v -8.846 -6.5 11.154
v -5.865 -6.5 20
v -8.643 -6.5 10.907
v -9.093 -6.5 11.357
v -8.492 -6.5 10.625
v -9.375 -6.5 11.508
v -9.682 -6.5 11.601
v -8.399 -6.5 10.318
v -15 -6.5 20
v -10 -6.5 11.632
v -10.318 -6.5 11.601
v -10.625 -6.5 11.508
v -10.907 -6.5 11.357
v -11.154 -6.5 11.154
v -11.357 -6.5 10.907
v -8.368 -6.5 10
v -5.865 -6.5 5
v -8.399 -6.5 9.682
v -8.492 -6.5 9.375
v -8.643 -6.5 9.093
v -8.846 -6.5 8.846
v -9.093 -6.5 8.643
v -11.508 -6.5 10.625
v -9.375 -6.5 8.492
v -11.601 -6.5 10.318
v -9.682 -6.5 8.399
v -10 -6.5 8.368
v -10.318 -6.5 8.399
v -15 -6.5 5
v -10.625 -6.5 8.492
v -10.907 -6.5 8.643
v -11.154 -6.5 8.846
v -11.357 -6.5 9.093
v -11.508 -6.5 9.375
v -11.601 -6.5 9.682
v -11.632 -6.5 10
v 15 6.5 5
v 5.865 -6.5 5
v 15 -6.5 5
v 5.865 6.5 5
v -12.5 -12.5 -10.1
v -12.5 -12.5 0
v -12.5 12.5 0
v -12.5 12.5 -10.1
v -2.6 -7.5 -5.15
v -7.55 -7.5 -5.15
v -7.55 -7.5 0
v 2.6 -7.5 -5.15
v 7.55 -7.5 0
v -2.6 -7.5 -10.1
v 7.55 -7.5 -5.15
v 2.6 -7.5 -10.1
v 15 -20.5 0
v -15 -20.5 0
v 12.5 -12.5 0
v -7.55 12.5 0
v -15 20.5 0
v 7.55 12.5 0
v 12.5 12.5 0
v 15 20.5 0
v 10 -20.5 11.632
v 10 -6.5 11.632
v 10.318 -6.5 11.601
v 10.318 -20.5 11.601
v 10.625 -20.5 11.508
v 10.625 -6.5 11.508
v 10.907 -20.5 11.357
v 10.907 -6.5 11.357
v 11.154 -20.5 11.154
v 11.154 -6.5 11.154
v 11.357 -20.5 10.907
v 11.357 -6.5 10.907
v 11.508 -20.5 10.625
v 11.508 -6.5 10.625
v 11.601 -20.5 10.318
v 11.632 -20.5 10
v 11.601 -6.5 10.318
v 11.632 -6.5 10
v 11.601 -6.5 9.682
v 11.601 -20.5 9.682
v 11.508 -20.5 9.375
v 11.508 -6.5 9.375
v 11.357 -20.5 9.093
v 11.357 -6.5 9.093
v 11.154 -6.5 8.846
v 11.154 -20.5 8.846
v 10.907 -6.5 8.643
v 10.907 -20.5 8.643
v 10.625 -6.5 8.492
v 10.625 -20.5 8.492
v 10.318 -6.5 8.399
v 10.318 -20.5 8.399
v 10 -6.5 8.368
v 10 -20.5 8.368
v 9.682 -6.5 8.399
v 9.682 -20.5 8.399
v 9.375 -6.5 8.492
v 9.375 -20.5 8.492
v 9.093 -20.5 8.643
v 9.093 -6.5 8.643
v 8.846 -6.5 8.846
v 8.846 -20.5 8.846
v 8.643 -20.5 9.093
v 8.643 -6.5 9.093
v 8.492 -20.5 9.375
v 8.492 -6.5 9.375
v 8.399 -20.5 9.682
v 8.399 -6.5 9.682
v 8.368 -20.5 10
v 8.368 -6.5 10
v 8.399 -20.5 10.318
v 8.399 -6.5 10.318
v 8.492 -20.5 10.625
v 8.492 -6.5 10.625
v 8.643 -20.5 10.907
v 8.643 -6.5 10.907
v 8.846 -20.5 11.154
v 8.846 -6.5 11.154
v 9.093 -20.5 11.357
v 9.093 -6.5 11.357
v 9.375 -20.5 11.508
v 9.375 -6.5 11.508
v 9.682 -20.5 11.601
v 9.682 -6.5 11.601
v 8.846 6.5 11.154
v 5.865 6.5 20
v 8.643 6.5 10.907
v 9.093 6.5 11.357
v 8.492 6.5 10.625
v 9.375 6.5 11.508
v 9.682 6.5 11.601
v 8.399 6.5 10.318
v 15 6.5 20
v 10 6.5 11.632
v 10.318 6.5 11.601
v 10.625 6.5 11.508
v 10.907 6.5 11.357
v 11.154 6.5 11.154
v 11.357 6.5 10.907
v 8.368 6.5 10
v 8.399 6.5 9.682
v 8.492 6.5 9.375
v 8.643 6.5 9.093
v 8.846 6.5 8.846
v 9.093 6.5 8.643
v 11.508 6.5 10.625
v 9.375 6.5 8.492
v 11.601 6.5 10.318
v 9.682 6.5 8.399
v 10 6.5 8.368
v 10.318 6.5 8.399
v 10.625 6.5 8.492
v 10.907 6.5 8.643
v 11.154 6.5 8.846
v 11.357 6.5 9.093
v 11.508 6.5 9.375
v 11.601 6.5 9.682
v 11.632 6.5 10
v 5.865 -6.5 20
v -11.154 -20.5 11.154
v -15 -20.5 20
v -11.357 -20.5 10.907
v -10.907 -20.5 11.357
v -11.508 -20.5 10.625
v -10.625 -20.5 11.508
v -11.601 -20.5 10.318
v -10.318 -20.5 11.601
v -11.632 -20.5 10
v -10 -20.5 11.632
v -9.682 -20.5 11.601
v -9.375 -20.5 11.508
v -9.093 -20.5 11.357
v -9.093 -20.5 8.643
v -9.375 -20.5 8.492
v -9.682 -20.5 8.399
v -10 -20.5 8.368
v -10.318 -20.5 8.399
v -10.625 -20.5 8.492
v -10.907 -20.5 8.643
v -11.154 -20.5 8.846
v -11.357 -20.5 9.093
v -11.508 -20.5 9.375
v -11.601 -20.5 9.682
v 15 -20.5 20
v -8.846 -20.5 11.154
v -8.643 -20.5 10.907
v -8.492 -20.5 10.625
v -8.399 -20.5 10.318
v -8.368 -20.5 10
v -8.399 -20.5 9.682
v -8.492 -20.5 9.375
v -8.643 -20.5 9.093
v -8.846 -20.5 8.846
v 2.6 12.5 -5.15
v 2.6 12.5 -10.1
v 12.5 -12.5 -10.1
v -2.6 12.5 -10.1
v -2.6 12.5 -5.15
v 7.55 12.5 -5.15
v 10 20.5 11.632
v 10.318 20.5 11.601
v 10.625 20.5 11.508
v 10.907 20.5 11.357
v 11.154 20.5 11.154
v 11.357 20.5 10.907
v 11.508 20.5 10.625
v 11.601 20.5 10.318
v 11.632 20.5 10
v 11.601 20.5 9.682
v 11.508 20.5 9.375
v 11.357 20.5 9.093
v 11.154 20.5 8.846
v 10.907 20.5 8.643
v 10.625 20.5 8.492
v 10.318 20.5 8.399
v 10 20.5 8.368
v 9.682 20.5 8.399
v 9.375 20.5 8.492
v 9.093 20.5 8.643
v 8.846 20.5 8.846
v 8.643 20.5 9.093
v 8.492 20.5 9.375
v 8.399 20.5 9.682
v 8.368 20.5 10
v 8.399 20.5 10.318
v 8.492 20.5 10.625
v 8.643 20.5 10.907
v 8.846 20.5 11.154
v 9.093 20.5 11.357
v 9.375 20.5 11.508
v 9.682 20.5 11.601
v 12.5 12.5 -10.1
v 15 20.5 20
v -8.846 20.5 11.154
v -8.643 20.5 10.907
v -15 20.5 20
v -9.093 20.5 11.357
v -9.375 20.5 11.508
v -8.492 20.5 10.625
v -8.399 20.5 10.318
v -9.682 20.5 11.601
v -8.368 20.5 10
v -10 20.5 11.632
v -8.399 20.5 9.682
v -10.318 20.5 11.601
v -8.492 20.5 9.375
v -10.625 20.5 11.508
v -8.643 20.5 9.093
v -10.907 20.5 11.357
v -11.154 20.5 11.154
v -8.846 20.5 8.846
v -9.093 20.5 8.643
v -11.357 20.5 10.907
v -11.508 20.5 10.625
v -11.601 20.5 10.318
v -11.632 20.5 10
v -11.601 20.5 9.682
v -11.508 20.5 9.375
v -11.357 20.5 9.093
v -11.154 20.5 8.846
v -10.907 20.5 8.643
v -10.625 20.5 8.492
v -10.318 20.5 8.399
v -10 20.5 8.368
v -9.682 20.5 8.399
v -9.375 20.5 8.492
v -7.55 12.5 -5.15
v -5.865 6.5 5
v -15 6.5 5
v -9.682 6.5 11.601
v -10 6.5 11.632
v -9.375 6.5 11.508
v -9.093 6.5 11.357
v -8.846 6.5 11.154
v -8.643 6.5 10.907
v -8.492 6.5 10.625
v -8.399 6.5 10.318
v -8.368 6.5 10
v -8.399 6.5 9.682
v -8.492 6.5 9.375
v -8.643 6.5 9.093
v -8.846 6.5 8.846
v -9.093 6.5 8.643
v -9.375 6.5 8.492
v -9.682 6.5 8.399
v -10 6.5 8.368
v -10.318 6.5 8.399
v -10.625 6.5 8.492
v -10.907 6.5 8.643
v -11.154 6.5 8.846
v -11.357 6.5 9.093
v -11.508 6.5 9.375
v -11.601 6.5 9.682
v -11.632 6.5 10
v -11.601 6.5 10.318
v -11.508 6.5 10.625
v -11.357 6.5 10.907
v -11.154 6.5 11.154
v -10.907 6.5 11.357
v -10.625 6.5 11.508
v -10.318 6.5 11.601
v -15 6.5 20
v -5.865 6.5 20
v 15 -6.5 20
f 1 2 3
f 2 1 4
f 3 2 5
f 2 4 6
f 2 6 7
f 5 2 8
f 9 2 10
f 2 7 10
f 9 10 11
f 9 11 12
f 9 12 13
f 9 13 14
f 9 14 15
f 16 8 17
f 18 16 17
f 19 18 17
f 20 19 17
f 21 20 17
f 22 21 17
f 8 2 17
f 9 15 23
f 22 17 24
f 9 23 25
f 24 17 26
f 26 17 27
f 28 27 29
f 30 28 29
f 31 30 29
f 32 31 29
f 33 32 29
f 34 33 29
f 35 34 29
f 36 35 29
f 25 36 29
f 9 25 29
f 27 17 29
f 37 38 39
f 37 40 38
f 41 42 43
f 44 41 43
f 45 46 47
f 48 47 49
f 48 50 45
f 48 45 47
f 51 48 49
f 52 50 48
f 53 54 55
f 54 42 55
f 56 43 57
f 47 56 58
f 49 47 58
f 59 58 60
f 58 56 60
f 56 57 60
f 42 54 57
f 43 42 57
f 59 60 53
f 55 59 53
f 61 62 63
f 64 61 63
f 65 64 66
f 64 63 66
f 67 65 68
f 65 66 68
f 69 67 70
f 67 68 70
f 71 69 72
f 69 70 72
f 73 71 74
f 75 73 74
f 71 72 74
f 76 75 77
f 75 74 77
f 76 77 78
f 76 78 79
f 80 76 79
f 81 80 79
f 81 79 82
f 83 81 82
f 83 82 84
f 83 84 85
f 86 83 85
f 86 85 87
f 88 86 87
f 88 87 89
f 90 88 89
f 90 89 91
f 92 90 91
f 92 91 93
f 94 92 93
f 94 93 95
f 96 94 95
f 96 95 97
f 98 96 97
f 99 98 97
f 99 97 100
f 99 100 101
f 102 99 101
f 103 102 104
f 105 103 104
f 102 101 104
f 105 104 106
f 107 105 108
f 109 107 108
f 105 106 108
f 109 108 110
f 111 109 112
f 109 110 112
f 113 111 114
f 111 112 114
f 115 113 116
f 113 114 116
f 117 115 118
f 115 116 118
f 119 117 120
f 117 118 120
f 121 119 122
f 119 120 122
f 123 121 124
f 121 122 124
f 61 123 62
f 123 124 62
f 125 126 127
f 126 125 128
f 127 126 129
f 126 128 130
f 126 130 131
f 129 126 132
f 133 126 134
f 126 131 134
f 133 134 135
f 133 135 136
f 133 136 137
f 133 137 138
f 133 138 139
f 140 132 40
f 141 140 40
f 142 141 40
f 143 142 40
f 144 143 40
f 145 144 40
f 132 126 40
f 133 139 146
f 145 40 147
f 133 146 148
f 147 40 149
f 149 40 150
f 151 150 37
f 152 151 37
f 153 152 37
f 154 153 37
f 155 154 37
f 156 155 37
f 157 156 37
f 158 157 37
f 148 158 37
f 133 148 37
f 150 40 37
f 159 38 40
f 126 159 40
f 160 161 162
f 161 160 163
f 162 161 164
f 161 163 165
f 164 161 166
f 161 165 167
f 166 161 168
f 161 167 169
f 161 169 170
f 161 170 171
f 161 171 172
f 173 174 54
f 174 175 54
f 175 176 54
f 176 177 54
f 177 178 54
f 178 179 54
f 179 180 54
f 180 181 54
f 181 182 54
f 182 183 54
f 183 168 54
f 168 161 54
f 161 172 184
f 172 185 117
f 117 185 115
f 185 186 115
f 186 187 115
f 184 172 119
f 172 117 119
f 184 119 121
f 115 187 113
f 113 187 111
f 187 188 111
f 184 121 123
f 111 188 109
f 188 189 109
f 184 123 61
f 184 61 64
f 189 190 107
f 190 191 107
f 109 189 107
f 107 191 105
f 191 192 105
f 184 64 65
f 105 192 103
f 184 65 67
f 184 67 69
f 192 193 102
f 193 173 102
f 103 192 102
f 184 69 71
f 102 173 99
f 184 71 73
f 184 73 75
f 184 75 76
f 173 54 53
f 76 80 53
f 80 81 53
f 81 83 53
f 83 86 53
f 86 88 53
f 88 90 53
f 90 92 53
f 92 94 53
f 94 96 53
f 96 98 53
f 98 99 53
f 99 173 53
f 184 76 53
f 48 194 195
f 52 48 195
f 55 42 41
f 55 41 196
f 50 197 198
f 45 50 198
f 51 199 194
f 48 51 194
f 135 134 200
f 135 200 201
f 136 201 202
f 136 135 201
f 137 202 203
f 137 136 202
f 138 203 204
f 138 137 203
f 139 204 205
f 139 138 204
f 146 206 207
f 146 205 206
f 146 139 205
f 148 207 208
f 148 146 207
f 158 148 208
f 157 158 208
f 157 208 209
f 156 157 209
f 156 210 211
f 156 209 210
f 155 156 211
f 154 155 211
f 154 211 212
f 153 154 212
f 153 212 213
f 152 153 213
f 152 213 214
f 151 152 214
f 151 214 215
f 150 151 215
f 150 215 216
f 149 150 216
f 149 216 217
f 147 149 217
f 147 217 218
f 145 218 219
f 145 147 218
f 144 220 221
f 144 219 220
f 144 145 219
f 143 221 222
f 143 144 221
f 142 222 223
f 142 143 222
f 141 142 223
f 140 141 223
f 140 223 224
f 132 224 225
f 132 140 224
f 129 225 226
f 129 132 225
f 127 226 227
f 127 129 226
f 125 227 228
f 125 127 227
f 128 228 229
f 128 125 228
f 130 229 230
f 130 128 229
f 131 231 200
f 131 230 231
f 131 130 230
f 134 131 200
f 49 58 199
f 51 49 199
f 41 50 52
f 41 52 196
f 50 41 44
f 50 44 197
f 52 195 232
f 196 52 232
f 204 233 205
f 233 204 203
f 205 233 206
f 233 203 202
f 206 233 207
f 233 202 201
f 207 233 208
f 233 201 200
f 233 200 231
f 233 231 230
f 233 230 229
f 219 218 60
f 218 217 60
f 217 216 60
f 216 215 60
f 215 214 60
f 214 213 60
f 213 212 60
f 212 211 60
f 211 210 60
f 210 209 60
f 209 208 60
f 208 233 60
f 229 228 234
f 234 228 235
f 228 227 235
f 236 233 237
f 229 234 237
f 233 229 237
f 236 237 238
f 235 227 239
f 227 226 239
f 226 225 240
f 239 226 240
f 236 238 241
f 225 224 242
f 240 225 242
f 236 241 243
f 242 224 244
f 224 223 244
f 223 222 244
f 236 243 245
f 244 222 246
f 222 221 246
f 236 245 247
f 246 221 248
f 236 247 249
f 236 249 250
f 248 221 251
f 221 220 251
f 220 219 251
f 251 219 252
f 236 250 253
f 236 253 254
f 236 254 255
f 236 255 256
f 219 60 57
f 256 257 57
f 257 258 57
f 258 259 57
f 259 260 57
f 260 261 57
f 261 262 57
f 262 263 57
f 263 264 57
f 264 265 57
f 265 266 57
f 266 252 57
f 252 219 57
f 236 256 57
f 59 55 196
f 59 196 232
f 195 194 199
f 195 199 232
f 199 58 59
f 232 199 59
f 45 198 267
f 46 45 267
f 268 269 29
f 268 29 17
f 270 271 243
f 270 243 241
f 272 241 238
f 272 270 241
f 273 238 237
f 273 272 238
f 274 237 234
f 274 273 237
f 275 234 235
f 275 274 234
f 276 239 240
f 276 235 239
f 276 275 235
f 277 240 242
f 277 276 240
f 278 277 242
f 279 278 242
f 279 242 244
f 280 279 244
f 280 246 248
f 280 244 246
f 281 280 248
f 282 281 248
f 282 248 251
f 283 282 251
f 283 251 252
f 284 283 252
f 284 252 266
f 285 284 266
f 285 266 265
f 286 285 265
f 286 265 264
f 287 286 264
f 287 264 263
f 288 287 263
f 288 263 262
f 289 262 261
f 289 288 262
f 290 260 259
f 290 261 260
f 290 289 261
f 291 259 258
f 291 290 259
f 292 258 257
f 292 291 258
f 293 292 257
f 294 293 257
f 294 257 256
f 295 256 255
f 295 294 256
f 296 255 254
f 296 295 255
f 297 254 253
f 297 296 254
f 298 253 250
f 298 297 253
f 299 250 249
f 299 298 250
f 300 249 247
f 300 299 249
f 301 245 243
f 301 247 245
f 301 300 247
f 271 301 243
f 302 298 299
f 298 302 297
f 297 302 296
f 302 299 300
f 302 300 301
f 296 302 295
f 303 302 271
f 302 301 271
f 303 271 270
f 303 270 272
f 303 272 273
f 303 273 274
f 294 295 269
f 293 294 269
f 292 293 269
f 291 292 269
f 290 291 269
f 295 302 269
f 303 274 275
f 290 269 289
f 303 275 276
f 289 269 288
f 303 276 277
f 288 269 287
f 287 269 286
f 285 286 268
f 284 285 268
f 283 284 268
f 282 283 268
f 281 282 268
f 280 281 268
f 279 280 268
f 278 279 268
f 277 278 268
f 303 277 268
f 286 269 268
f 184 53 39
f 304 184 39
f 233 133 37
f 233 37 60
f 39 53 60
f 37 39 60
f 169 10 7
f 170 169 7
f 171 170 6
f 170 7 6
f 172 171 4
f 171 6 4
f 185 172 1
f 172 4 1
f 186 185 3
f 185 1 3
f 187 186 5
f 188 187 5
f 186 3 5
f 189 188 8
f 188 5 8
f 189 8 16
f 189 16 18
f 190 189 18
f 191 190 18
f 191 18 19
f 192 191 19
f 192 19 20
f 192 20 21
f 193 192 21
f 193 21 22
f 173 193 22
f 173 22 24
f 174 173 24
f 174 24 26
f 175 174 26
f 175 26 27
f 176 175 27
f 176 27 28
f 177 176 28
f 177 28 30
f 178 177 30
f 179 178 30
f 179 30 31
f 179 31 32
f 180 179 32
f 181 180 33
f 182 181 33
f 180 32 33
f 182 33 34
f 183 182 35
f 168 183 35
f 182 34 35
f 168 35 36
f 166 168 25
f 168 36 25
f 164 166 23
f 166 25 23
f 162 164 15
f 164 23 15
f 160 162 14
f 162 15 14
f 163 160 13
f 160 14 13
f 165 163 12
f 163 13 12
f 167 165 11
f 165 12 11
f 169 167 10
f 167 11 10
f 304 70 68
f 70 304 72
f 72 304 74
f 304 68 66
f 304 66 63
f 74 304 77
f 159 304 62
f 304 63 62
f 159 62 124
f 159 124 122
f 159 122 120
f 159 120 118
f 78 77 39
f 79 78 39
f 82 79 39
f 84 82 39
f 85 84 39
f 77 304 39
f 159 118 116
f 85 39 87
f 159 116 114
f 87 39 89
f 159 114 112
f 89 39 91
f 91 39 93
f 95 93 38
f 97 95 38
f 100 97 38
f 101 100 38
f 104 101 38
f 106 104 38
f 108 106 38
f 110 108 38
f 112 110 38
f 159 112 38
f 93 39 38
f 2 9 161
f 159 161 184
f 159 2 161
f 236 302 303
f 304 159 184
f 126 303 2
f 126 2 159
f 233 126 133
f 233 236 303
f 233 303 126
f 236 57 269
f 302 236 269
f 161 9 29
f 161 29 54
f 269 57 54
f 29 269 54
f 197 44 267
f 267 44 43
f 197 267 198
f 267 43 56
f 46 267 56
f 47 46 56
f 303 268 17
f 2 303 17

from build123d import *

# Parameters (mm, degrees)
BOSS_EXTRUDE1_DEPTH     = 20
SKETCH3_R               = 1.632108338
CUT_EXTRUDE1_DEPTH      = 33.330326321
CUT_EXTRUDE1_DEPTH_BACK = 33.330326321
SKETCH4_W               = 30
SKETCH4_H               = 41
BOSS_EXTRUDE2_DEPTH     = 5
SKETCH6_W               = 25
SKETCH6_H               = 25
BOSS_EXTRUDE3_DEPTH     = 20
CUT_EXTRUDE4_START      = 12.5
CUT_EXTRUDE4_DEPTH      = 20
SKETCH8_W               = 9.9
SKETCH8_H               = 9.9
SKETCH8_W_2             = 15.1
CUT_EXTRUDE5_DEPTH      = 33.330326321
CUT_EXTRUDE5_DEPTH_BACK = 33.330326321


with BuildPart() as part:
    # Sketch2 → Boss-Extrude1 (new body)
    with BuildSketch(Plane.XY):
        Polygon((0, 20.5), (-15, 20.5), (-15, 6.5), (-5.864885696, 6.5), (-5.864885696, -6.5), (-15, -6.5), (-15, -20.5), (0, -20.5), (15, -20.5), (15, -6.5), (5.864885696, -6.5), (5.864885696, 6.5), (15, 6.5), (15, 20.5), align=None)
    extrude(amount=BOSS_EXTRUDE1_DEPTH)

    # Sketch3 → Cut-Extrude1 (cut, two sides)
    with BuildSketch(Plane(origin=(0, 0, 0), x_dir=(1, 0, 0), z_dir=(0, 1, 0))) as cut_extrude1_sk:
        with Locations(Location((-10, -10, 0), (0, 0, 270))):
            Circle(SKETCH3_R)
        with Locations(Location((10, -10, 0), (0, 0, 270))):
            Circle(SKETCH3_R)
    extrude(amount=CUT_EXTRUDE1_DEPTH, mode=Mode.SUBTRACT)
    extrude(cut_extrude1_sk.sketch, amount=-CUT_EXTRUDE1_DEPTH_BACK, mode=Mode.SUBTRACT)

    # Sketch4 → Boss-Extrude2 (add)
    with BuildSketch(Plane.XY):
        Rectangle(SKETCH4_W, SKETCH4_H)
    extrude(amount=BOSS_EXTRUDE2_DEPTH)

    # Sketch6 → Boss-Extrude3 (add)
    with BuildSketch(Plane.XY):
        Rectangle(SKETCH6_W, SKETCH6_H)
    extrude(amount=-BOSS_EXTRUDE3_DEPTH)

    # Sketch7 → Cut-Extrude4 (cut)
    with BuildSketch(Plane(origin=(0, 0, 0), x_dir=(1, 0, 0), z_dir=(0, 1, 0)).offset(CUT_EXTRUDE4_START)):
        Polygon((-2.6, 5.15), (-7.55, 5.15), (-7.55, 0), (0, 0), (0, 10.1), (-2.6, 10.1), align=None)
        Polygon((0, 10.1), (0, 0), (7.55, 0), (7.55, 5.15), (2.6, 5.15), (2.6, 10.1), align=None)
    extrude(amount=-CUT_EXTRUDE4_DEPTH, mode=Mode.SUBTRACT)

    # Sketch8 → Cut-Extrude5 (cut, two sides)
    with BuildSketch(Plane(origin=(0, 0, 0), x_dir=(1, 0, 0), z_dir=(0, 1, 0))) as cut_extrude5_sk:
        with Locations((-7.55, 15.05)):
            Rectangle(SKETCH8_W, SKETCH8_H)
        with Locations((4.95, 15.05)):
            Rectangle(SKETCH8_W_2, SKETCH8_H)
    extrude(amount=CUT_EXTRUDE5_DEPTH, mode=Mode.SUBTRACT)
    extrude(cut_extrude5_sk.sketch, amount=-CUT_EXTRUDE5_DEPTH_BACK, mode=Mode.SUBTRACT)


solid = part.part
